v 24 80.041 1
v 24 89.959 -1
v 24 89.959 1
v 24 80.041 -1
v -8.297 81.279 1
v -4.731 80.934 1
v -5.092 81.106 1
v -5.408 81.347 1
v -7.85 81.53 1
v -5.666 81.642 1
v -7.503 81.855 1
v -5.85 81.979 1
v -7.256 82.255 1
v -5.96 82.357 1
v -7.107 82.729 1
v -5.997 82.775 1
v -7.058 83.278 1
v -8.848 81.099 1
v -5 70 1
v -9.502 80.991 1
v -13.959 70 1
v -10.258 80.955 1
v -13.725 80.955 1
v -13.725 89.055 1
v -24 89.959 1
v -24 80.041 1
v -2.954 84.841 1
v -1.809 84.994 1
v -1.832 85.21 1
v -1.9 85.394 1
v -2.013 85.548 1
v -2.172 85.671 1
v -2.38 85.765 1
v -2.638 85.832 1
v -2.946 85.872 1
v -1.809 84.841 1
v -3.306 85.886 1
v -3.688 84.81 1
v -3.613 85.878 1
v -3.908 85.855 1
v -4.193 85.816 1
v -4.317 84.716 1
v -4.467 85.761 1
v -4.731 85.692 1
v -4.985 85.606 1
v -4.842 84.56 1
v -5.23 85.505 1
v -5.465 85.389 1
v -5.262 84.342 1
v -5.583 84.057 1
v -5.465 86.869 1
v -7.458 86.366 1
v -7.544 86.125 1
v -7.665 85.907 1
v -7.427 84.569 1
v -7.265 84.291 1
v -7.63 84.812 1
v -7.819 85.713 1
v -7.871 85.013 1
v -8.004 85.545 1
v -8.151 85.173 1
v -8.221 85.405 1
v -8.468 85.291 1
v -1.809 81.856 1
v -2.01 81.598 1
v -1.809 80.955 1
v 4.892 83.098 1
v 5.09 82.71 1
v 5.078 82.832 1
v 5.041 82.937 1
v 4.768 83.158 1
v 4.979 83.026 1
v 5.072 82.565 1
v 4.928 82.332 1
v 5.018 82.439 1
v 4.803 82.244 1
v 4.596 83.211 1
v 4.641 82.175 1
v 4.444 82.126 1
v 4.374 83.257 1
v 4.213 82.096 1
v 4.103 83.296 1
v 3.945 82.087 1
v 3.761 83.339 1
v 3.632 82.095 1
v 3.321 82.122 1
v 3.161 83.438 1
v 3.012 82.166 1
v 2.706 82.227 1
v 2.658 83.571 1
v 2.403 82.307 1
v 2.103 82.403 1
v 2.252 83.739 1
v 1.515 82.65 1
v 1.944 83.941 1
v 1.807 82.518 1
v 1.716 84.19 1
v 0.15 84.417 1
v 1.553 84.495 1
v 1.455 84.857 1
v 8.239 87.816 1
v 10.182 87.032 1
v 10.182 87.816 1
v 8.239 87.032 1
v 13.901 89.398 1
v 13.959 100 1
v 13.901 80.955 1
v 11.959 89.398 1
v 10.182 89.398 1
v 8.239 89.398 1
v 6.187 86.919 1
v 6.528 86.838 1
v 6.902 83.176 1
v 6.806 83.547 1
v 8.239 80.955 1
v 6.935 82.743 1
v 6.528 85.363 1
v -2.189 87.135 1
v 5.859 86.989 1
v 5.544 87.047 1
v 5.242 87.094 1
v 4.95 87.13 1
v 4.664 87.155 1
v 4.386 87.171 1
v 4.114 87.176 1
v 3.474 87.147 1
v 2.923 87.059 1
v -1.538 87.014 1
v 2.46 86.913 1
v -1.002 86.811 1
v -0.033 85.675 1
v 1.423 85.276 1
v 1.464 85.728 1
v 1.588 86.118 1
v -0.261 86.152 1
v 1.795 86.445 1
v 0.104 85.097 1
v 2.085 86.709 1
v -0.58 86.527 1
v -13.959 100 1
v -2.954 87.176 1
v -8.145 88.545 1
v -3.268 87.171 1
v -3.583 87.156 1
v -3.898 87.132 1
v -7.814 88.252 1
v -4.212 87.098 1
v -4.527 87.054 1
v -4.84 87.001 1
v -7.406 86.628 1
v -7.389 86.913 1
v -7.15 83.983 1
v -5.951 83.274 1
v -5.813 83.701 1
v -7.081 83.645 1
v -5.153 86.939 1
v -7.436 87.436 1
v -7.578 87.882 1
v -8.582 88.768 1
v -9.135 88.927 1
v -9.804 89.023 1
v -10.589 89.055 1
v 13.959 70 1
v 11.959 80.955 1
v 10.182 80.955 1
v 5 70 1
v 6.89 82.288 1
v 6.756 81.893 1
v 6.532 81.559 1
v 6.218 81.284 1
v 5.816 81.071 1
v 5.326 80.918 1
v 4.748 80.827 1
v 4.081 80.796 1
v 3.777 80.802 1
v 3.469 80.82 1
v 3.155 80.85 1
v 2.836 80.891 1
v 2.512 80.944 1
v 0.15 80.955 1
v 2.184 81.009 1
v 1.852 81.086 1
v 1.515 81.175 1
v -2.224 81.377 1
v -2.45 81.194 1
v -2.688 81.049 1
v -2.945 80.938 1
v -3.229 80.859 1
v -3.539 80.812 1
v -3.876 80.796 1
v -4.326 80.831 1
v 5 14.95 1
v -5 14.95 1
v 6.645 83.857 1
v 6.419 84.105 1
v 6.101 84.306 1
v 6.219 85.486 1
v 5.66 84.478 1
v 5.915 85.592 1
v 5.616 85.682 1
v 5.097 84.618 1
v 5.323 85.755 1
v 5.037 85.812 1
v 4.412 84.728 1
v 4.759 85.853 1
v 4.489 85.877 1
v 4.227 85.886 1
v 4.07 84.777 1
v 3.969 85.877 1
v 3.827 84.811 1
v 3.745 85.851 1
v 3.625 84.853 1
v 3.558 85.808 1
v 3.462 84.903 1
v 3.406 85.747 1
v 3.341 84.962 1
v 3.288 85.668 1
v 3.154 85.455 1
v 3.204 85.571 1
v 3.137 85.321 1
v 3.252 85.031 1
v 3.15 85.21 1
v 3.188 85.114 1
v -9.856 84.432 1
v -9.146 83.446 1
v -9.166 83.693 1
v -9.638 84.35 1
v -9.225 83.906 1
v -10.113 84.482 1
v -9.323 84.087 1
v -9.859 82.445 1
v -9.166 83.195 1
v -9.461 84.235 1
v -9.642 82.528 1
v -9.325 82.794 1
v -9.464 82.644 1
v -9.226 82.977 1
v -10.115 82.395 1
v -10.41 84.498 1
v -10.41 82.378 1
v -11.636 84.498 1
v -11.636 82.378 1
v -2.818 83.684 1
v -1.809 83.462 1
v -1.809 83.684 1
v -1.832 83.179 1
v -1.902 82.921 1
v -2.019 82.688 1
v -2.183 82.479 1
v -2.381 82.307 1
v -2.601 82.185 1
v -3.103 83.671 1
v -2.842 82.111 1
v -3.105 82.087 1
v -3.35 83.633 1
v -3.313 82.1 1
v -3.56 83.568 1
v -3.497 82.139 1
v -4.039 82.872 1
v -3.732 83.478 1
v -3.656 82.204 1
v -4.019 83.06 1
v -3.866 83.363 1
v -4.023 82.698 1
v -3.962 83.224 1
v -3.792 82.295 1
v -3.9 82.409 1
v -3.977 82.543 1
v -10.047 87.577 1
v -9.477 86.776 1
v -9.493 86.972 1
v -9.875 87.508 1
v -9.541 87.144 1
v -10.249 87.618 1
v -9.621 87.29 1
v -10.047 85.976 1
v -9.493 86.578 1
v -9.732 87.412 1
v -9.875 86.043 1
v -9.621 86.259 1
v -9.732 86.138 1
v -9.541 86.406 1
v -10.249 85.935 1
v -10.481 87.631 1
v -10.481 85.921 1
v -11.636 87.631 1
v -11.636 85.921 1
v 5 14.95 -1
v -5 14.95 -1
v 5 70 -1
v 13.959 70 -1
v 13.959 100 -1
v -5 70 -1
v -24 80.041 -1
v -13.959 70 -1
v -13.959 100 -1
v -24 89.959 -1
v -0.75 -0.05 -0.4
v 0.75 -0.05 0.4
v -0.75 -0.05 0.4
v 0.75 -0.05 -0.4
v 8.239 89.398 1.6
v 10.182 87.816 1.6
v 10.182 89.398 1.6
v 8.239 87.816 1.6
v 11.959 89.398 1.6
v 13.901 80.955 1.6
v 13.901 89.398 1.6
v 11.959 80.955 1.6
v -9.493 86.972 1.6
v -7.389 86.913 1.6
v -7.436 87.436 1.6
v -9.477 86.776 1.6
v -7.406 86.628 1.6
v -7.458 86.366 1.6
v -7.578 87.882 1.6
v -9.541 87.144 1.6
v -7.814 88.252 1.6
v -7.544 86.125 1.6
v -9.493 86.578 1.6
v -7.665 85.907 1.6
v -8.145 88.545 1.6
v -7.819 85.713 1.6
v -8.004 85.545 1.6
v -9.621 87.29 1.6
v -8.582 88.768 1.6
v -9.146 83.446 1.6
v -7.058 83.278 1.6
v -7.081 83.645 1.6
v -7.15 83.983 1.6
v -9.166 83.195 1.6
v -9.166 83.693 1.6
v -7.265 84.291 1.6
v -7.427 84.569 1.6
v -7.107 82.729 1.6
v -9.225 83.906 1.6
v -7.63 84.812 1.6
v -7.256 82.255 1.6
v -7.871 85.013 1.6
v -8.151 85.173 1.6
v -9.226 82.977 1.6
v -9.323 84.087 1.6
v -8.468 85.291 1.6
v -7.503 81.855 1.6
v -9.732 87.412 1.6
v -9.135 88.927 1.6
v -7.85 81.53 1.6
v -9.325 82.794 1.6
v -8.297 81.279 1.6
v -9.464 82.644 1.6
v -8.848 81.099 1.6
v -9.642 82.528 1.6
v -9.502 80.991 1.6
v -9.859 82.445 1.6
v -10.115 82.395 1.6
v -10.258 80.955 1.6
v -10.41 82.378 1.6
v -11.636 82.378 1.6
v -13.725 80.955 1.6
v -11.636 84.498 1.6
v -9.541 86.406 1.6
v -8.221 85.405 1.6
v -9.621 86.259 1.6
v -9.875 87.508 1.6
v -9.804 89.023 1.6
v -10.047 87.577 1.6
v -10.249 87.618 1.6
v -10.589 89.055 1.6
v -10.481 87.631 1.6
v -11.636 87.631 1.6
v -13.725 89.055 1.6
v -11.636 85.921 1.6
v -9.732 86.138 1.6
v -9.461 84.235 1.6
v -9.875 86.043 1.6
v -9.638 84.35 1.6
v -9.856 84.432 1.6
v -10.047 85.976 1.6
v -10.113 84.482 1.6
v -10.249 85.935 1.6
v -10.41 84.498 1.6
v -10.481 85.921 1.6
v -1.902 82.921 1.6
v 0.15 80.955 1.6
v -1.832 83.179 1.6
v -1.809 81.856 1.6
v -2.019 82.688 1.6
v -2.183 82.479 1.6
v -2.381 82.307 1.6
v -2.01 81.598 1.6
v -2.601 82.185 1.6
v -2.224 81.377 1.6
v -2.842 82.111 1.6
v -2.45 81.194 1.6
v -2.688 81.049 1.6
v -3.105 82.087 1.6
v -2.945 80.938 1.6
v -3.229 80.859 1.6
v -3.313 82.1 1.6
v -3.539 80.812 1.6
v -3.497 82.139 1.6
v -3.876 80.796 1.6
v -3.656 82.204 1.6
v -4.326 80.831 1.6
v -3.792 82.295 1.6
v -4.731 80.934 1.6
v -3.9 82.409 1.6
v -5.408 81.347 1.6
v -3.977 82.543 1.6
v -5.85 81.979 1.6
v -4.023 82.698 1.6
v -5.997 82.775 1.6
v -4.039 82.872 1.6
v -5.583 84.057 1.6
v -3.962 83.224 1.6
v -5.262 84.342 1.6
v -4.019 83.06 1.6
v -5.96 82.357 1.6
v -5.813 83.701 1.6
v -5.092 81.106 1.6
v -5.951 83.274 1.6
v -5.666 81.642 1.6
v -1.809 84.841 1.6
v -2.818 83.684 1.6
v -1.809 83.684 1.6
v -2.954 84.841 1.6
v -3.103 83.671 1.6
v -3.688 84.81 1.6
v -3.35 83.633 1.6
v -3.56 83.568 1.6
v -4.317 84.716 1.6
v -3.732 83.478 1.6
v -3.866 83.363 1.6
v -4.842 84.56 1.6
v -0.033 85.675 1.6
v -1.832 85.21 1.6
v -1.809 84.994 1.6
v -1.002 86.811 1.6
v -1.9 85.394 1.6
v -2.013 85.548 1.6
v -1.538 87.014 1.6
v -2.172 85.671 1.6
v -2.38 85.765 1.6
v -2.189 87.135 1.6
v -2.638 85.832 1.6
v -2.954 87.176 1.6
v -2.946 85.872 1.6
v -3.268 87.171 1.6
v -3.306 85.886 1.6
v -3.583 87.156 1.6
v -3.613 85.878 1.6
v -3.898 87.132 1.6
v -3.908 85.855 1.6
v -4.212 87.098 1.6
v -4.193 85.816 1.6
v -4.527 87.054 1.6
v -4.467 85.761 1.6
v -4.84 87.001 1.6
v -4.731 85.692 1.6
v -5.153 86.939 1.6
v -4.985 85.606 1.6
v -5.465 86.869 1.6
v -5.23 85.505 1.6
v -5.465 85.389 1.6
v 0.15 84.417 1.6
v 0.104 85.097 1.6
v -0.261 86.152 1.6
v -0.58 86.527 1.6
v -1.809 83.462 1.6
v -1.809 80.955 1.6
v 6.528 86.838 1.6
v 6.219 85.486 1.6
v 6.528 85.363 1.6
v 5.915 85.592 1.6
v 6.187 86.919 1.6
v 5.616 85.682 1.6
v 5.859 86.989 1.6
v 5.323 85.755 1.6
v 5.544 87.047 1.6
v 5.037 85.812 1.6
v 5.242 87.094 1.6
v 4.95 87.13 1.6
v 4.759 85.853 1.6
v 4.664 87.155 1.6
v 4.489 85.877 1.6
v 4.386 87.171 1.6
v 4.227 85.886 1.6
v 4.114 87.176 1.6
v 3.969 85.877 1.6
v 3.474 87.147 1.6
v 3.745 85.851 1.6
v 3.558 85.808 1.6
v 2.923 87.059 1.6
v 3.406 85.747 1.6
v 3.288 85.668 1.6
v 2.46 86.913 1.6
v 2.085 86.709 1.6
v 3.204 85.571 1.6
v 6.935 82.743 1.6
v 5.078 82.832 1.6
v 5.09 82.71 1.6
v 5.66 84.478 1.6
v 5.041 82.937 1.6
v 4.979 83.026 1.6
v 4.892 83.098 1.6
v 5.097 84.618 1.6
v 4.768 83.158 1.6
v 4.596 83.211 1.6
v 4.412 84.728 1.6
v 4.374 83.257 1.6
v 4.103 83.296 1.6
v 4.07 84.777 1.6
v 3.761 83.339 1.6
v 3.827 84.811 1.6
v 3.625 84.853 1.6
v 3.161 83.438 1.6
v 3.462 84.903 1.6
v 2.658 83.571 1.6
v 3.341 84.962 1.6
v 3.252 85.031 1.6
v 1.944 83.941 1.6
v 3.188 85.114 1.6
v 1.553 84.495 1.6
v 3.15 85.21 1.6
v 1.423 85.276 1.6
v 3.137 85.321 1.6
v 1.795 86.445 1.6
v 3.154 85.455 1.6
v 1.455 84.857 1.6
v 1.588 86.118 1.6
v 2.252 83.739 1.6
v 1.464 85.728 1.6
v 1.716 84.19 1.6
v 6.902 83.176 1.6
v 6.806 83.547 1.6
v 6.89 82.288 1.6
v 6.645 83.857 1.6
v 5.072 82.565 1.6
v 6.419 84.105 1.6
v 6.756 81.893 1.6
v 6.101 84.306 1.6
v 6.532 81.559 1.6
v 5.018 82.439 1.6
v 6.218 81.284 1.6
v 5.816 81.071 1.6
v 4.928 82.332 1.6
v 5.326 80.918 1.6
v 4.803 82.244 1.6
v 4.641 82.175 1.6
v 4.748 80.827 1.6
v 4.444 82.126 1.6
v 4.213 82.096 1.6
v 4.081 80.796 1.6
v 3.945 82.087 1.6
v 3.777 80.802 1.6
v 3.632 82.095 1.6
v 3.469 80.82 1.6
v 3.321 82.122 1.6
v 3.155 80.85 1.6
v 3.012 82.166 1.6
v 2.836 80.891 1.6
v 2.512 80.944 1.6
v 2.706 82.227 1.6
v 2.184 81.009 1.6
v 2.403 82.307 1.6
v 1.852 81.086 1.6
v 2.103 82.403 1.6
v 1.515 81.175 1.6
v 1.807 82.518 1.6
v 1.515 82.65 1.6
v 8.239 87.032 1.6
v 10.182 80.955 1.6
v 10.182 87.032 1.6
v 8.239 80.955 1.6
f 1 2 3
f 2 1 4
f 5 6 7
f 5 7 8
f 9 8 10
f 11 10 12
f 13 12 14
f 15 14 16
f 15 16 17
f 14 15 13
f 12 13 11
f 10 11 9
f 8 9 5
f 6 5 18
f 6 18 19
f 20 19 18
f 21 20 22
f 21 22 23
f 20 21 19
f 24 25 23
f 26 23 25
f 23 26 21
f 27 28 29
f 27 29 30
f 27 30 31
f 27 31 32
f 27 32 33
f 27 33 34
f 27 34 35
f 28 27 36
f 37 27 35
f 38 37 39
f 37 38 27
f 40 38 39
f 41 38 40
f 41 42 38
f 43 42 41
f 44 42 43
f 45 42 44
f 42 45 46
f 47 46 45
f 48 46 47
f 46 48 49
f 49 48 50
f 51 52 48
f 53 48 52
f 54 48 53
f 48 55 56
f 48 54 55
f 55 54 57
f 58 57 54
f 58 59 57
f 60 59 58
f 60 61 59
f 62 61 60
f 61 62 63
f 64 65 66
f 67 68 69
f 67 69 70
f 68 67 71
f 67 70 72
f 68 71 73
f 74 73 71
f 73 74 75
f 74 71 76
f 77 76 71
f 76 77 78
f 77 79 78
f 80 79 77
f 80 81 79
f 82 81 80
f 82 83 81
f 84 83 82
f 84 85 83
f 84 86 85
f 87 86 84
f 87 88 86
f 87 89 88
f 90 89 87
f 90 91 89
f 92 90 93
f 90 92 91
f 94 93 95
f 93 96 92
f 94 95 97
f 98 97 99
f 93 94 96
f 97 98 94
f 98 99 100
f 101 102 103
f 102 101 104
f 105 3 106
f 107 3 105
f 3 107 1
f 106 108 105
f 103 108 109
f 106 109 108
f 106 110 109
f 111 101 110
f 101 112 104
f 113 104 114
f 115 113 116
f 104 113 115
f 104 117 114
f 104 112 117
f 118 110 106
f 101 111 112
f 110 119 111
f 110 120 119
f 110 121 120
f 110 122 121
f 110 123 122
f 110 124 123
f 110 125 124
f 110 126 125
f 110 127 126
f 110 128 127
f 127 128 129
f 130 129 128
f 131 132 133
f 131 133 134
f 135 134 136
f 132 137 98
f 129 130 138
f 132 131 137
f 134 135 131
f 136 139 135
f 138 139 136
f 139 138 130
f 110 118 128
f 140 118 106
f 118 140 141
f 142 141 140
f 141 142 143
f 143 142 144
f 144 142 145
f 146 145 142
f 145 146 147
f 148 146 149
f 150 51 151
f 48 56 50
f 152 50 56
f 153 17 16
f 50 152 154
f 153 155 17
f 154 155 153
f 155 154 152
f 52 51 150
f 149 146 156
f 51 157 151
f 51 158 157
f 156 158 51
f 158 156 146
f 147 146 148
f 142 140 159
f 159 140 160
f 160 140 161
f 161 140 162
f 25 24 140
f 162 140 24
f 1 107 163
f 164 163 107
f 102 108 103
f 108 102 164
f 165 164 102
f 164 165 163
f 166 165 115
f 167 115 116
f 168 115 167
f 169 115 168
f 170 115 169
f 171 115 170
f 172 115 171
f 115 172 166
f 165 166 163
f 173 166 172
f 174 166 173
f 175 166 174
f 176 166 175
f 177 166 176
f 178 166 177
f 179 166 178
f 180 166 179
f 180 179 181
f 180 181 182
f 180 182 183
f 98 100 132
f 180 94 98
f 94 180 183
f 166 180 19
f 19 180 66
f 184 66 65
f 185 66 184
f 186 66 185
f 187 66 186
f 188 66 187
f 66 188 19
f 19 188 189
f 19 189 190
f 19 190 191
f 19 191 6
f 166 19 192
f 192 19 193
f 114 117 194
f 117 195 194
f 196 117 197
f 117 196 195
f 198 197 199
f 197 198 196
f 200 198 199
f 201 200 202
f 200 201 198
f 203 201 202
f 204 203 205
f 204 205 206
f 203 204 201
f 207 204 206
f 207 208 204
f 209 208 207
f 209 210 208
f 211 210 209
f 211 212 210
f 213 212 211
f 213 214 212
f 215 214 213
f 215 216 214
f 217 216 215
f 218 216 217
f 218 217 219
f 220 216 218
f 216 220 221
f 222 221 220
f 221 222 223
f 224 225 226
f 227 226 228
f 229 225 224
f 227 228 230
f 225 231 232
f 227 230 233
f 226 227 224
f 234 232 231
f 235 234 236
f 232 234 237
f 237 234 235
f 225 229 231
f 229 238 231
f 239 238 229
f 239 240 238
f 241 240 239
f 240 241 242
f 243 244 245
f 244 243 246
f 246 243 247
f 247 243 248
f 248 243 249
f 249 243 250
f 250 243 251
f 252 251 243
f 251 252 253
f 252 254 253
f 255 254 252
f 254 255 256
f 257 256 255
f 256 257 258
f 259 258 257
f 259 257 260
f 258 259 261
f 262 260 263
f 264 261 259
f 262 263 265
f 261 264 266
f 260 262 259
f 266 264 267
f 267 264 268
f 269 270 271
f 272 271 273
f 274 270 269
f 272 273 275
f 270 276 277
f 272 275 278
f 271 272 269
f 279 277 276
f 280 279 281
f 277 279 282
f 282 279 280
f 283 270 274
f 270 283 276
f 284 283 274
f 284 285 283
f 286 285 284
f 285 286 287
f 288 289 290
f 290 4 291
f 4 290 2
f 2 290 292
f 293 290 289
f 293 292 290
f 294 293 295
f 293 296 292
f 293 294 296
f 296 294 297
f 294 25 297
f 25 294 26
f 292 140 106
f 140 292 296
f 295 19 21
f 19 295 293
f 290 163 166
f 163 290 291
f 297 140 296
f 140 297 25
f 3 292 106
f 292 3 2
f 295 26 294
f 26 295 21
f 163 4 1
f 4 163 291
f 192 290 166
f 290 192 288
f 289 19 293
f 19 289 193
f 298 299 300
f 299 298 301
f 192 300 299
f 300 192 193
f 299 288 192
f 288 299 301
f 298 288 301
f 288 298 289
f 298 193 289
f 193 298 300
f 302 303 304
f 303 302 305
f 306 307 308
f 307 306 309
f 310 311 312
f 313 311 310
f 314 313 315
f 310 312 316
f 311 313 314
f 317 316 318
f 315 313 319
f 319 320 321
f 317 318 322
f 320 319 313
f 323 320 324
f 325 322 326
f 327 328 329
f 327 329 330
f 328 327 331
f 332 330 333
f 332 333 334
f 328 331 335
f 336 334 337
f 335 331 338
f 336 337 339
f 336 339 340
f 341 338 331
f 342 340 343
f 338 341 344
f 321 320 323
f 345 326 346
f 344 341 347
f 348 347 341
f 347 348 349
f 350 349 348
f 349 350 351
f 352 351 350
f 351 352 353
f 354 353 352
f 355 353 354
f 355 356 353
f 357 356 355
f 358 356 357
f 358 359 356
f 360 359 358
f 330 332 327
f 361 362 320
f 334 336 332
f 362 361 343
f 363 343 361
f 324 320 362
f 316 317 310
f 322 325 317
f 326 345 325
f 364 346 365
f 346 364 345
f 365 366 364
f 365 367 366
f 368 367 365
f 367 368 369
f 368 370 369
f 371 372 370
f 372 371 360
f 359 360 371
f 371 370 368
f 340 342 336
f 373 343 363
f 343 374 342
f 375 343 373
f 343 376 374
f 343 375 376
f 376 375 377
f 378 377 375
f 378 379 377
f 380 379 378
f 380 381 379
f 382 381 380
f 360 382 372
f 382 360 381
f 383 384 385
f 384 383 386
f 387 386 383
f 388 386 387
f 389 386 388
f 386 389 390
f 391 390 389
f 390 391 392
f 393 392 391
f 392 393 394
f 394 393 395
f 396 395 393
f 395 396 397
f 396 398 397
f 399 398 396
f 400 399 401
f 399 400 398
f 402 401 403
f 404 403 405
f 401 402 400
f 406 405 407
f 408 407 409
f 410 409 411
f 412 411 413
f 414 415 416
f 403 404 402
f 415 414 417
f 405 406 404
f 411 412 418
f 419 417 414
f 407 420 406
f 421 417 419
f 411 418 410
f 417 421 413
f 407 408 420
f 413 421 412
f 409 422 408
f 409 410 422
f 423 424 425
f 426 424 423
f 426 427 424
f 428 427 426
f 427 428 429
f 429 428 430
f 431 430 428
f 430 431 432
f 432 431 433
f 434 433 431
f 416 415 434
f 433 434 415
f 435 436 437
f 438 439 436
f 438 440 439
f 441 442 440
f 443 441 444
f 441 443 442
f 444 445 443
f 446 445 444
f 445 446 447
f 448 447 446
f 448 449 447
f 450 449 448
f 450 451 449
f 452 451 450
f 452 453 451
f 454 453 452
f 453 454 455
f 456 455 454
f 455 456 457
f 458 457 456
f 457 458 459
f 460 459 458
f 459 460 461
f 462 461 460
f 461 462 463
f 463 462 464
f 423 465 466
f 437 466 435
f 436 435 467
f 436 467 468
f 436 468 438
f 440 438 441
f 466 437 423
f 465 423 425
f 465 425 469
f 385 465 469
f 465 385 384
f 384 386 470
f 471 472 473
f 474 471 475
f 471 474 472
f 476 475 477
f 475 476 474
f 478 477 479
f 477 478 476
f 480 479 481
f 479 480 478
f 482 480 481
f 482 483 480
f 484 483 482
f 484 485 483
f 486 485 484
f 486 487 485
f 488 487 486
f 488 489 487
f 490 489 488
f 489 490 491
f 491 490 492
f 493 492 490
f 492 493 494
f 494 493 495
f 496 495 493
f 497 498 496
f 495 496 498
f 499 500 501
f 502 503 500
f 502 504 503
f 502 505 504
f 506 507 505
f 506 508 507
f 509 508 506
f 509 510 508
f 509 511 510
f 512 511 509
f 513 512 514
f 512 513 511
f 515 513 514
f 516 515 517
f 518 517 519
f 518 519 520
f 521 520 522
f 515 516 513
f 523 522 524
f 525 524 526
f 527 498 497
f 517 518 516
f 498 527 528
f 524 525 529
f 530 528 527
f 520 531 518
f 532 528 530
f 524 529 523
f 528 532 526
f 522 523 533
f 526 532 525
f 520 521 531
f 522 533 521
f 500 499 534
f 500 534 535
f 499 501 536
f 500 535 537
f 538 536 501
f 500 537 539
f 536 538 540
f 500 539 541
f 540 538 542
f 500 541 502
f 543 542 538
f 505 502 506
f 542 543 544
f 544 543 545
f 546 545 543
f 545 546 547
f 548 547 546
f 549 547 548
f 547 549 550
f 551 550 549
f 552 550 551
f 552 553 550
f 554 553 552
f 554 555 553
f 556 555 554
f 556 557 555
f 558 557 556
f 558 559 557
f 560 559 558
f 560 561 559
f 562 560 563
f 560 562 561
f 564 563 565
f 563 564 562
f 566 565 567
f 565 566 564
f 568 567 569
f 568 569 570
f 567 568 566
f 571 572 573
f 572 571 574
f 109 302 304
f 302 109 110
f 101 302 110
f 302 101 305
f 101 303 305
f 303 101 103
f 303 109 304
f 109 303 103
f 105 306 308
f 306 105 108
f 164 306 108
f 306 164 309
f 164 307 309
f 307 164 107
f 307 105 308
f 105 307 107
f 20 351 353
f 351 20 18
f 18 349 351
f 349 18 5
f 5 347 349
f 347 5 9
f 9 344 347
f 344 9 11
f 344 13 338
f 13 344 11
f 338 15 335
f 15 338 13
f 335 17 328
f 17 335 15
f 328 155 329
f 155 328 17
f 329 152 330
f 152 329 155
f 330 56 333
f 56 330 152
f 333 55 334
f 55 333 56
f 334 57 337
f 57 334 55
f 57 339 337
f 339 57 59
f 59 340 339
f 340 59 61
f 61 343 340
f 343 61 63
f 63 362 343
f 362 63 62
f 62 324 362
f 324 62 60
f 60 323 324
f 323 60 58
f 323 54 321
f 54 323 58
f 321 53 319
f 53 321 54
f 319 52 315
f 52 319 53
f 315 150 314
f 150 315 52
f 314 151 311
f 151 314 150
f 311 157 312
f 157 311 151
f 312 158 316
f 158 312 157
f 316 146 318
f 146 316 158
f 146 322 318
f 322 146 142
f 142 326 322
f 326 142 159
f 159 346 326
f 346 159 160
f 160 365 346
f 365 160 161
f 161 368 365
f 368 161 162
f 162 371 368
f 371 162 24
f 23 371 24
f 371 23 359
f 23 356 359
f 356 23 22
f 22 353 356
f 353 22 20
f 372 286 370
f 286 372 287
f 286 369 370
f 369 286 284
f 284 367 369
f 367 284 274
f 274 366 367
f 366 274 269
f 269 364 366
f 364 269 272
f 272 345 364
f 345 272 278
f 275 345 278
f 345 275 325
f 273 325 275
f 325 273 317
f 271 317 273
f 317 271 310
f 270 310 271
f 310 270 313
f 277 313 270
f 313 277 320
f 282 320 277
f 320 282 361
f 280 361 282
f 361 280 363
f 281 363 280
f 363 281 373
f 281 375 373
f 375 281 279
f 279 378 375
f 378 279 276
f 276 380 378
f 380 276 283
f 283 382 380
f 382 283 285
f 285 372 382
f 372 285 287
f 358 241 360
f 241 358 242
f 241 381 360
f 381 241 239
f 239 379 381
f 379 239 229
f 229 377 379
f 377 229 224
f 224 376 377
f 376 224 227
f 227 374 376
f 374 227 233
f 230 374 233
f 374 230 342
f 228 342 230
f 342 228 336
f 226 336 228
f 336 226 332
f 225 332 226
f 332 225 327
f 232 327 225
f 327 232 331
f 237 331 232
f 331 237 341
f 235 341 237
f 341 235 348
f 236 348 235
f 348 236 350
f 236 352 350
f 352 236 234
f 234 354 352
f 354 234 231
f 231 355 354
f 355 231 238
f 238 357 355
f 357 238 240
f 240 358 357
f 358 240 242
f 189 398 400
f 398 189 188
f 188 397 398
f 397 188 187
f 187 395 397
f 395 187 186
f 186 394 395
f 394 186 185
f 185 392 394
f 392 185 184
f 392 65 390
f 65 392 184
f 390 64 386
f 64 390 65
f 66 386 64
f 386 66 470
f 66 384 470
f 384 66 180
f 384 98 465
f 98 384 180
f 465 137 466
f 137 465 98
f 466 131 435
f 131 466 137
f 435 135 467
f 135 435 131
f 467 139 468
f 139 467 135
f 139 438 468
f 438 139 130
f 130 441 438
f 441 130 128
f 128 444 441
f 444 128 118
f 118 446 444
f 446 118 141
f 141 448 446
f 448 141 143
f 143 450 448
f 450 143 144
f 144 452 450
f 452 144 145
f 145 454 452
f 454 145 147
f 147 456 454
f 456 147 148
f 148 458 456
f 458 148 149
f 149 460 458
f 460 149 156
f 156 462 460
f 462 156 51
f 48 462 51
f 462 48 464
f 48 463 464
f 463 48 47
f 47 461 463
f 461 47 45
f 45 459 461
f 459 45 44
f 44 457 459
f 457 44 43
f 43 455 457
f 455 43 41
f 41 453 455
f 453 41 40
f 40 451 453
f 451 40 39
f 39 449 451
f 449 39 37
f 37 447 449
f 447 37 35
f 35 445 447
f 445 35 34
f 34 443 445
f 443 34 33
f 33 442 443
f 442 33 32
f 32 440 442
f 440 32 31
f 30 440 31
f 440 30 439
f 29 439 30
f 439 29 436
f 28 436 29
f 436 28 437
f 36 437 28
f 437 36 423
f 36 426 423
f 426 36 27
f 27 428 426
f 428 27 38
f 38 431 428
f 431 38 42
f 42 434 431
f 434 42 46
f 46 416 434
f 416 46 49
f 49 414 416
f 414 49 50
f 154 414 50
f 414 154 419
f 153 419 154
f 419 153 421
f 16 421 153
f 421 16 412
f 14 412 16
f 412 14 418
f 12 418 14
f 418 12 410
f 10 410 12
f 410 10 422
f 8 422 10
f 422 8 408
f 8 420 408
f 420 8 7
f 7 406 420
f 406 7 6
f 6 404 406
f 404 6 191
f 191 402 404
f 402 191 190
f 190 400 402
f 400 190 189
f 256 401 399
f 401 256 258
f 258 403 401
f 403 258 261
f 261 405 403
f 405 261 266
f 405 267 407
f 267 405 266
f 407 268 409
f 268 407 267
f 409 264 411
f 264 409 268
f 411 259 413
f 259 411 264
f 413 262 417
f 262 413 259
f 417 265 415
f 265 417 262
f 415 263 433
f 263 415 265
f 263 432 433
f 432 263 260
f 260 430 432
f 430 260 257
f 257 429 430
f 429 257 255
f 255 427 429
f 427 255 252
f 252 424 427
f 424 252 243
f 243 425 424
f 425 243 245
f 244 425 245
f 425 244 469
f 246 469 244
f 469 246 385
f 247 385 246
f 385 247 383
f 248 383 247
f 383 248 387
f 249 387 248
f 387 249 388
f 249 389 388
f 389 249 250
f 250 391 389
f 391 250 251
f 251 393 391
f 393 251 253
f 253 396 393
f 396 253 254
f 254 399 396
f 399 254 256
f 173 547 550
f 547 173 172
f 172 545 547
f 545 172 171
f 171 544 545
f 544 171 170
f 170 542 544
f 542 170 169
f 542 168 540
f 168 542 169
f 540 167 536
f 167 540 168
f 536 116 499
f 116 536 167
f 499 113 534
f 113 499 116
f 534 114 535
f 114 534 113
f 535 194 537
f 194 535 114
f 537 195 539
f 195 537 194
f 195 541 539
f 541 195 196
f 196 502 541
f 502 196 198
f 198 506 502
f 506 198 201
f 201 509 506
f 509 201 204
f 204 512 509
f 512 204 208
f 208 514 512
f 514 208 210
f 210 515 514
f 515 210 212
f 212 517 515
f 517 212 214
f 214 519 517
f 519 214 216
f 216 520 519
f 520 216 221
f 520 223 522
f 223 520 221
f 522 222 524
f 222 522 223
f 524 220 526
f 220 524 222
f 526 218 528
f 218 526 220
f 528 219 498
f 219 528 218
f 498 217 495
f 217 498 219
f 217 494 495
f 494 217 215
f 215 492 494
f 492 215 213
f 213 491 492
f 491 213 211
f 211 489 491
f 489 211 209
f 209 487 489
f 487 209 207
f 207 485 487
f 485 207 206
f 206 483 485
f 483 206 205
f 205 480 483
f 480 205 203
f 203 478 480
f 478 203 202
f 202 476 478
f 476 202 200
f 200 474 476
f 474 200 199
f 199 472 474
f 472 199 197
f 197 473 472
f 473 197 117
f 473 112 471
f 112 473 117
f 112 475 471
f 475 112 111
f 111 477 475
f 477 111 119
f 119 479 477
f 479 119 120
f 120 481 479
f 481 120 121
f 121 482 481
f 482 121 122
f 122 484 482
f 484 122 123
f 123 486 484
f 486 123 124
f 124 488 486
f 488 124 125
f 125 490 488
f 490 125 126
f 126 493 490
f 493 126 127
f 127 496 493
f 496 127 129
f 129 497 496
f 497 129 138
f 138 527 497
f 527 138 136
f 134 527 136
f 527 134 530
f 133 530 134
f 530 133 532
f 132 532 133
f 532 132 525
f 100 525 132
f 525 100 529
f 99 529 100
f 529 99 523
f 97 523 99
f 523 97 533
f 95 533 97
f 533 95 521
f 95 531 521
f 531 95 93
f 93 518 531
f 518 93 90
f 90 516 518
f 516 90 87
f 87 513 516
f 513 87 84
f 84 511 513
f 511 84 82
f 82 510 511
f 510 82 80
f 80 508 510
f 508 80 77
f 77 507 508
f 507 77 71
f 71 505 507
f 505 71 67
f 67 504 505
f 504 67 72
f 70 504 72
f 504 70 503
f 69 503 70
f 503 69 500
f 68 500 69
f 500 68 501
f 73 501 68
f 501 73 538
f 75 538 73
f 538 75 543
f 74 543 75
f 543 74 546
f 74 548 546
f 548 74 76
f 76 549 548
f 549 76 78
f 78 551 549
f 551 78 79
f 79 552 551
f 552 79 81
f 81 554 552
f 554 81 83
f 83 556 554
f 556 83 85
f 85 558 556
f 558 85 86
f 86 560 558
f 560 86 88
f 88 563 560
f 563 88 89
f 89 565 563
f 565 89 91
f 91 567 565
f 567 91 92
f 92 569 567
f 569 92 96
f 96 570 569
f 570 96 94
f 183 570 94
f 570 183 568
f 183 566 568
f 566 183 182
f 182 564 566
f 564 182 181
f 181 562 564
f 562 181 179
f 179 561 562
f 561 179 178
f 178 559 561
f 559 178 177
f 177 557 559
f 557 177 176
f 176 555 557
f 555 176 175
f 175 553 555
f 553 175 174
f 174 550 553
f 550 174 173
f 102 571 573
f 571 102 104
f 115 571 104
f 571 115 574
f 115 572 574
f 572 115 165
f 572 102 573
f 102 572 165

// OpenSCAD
// Plant Label Stake — parametric with customizable text
// For MakerWorld Parametric Model Maker (Customizer)
// Print flat on bed, no supports needed

/* [Label Head] */
// Head width in mm
head_width = 48; // [30:2:80]
// Head height in mm
head_height = 30; // [20:2:50]
// Thickness in mm
thickness = 2; // [1.5:0.5:4]
// Top corner chamfer in mm (angular look)
chamfer_size = 10; // [0:1:20]

/* [Stake] */
// Stake width in mm
stake_width = 10; // [6:1:20]
// Stake length in mm (below head)
stake_length = 55; // [30:5:80]
// Tip taper length in mm
stake_tip_length = 15; // [8:1:25]

/* [Text] */
// Plant name to display
label_text = "Basil";
// Text size in mm
text_size = 8; // [4:1:15]
// Text depth in mm (how much it protrudes or is cut)
text_depth = 0.6; // [0.3:0.1:1.5]
// Text style
text_style = "embossed"; // [embossed:Raised text, engraved:Cut into surface]
// Font
font = "Work Sans"; // [Work Sans, Inter, Montserrat, Noto Sans, Nunito, Open Sans, Oswald, Playfair Display, Raleway, Roboto, Roboto Condensed, Roboto Mono, Roboto Slab, Rubik, Source Sans 3, Ubuntu Sans, Lora, Merriweather Sans, Roboto Serif]
// Font style
font_style = "Bold"; // [Regular, Bold, Italic, Bold Italic, Light, Medium, SemiBold, ExtraBold, Thin, Black]

/* [Hidden] */
$fn = 24;
total_height = head_height + stake_length + stake_tip_length;
label_font = str(font, ":style=", font_style);

// Head center Y position (head sits at top)
head_center_y = stake_length + stake_tip_length + head_height / 2;

// === MODULES ===

module chamfered_rect(w, h, t, c) {
    // Rectangle with chamfered top and bottom corners
    if (c > 0) {
        difference() {
            cube([w, h, t], center = true);
            // Chamfer top-left
            translate([-(w/2), h/2, 0])
                rotate([0, 0, 45])
                    cube([c * 1.42, c * 1.42, t + 1], center = true);
            // Chamfer top-right
            translate([w/2, h/2, 0])
                rotate([0, 0, 45])
                    cube([c * 1.42, c * 1.42, t + 1], center = true);
            // Chamfer bottom-left
            translate([-(w/2), -h/2, 0])
                rotate([0, 0, 45])
                    cube([c * 1.42, c * 1.42, t + 1], center = true);
            // Chamfer bottom-right
            translate([w/2, -h/2, 0])
                rotate([0, 0, 45])
                    cube([c * 1.42, c * 1.42, t + 1], center = true);
        }
    } else {
        cube([w, h, t], center = true);
    }
}

// === MAIN ===

// Combine label body + text
if (text_style == "embossed") {
    // Body
    label_body();
    // Raised text on front face
    translate([0, head_center_y, thickness / 2])
        linear_extrude(text_depth)
            text(label_text, size = text_size, font = label_font,
                 halign = "center", valign = "center");
} else {
    difference() {
        // Body
        label_body();
        // Engraved text into front face
        translate([0, head_center_y, thickness / 2 - text_depth + 0.01])
            linear_extrude(text_depth + 0.1)
                text(label_text, size = text_size, font = label_font,
                     halign = "center", valign = "center");
    }
}

module label_body() {
    // Head — chamfered rectangle
    translate([0, head_center_y, 0])
        chamfered_rect(head_width, head_height, thickness, chamfer_size);

    // Stake — straight section
    stake_center_y = stake_tip_length + stake_length / 2;
    translate([0, stake_center_y, 0])
        cube([stake_width, stake_length, thickness], center = true);

    // Tip — taper to point
    hull() {
        // Top of tip = bottom of stake
        translate([0, stake_tip_length, 0])
            cube([stake_width, 0.1, thickness], center = true);
        // Bottom point
        translate([0, 0, 0])
            cube([1.5, 0.1, thickness * 0.4], center = true);
    }
}

echo(str("Total height: ", total_height, "mm"));
echo(str("Text: \"", label_text, "\" in ", font, " ", font_style));
